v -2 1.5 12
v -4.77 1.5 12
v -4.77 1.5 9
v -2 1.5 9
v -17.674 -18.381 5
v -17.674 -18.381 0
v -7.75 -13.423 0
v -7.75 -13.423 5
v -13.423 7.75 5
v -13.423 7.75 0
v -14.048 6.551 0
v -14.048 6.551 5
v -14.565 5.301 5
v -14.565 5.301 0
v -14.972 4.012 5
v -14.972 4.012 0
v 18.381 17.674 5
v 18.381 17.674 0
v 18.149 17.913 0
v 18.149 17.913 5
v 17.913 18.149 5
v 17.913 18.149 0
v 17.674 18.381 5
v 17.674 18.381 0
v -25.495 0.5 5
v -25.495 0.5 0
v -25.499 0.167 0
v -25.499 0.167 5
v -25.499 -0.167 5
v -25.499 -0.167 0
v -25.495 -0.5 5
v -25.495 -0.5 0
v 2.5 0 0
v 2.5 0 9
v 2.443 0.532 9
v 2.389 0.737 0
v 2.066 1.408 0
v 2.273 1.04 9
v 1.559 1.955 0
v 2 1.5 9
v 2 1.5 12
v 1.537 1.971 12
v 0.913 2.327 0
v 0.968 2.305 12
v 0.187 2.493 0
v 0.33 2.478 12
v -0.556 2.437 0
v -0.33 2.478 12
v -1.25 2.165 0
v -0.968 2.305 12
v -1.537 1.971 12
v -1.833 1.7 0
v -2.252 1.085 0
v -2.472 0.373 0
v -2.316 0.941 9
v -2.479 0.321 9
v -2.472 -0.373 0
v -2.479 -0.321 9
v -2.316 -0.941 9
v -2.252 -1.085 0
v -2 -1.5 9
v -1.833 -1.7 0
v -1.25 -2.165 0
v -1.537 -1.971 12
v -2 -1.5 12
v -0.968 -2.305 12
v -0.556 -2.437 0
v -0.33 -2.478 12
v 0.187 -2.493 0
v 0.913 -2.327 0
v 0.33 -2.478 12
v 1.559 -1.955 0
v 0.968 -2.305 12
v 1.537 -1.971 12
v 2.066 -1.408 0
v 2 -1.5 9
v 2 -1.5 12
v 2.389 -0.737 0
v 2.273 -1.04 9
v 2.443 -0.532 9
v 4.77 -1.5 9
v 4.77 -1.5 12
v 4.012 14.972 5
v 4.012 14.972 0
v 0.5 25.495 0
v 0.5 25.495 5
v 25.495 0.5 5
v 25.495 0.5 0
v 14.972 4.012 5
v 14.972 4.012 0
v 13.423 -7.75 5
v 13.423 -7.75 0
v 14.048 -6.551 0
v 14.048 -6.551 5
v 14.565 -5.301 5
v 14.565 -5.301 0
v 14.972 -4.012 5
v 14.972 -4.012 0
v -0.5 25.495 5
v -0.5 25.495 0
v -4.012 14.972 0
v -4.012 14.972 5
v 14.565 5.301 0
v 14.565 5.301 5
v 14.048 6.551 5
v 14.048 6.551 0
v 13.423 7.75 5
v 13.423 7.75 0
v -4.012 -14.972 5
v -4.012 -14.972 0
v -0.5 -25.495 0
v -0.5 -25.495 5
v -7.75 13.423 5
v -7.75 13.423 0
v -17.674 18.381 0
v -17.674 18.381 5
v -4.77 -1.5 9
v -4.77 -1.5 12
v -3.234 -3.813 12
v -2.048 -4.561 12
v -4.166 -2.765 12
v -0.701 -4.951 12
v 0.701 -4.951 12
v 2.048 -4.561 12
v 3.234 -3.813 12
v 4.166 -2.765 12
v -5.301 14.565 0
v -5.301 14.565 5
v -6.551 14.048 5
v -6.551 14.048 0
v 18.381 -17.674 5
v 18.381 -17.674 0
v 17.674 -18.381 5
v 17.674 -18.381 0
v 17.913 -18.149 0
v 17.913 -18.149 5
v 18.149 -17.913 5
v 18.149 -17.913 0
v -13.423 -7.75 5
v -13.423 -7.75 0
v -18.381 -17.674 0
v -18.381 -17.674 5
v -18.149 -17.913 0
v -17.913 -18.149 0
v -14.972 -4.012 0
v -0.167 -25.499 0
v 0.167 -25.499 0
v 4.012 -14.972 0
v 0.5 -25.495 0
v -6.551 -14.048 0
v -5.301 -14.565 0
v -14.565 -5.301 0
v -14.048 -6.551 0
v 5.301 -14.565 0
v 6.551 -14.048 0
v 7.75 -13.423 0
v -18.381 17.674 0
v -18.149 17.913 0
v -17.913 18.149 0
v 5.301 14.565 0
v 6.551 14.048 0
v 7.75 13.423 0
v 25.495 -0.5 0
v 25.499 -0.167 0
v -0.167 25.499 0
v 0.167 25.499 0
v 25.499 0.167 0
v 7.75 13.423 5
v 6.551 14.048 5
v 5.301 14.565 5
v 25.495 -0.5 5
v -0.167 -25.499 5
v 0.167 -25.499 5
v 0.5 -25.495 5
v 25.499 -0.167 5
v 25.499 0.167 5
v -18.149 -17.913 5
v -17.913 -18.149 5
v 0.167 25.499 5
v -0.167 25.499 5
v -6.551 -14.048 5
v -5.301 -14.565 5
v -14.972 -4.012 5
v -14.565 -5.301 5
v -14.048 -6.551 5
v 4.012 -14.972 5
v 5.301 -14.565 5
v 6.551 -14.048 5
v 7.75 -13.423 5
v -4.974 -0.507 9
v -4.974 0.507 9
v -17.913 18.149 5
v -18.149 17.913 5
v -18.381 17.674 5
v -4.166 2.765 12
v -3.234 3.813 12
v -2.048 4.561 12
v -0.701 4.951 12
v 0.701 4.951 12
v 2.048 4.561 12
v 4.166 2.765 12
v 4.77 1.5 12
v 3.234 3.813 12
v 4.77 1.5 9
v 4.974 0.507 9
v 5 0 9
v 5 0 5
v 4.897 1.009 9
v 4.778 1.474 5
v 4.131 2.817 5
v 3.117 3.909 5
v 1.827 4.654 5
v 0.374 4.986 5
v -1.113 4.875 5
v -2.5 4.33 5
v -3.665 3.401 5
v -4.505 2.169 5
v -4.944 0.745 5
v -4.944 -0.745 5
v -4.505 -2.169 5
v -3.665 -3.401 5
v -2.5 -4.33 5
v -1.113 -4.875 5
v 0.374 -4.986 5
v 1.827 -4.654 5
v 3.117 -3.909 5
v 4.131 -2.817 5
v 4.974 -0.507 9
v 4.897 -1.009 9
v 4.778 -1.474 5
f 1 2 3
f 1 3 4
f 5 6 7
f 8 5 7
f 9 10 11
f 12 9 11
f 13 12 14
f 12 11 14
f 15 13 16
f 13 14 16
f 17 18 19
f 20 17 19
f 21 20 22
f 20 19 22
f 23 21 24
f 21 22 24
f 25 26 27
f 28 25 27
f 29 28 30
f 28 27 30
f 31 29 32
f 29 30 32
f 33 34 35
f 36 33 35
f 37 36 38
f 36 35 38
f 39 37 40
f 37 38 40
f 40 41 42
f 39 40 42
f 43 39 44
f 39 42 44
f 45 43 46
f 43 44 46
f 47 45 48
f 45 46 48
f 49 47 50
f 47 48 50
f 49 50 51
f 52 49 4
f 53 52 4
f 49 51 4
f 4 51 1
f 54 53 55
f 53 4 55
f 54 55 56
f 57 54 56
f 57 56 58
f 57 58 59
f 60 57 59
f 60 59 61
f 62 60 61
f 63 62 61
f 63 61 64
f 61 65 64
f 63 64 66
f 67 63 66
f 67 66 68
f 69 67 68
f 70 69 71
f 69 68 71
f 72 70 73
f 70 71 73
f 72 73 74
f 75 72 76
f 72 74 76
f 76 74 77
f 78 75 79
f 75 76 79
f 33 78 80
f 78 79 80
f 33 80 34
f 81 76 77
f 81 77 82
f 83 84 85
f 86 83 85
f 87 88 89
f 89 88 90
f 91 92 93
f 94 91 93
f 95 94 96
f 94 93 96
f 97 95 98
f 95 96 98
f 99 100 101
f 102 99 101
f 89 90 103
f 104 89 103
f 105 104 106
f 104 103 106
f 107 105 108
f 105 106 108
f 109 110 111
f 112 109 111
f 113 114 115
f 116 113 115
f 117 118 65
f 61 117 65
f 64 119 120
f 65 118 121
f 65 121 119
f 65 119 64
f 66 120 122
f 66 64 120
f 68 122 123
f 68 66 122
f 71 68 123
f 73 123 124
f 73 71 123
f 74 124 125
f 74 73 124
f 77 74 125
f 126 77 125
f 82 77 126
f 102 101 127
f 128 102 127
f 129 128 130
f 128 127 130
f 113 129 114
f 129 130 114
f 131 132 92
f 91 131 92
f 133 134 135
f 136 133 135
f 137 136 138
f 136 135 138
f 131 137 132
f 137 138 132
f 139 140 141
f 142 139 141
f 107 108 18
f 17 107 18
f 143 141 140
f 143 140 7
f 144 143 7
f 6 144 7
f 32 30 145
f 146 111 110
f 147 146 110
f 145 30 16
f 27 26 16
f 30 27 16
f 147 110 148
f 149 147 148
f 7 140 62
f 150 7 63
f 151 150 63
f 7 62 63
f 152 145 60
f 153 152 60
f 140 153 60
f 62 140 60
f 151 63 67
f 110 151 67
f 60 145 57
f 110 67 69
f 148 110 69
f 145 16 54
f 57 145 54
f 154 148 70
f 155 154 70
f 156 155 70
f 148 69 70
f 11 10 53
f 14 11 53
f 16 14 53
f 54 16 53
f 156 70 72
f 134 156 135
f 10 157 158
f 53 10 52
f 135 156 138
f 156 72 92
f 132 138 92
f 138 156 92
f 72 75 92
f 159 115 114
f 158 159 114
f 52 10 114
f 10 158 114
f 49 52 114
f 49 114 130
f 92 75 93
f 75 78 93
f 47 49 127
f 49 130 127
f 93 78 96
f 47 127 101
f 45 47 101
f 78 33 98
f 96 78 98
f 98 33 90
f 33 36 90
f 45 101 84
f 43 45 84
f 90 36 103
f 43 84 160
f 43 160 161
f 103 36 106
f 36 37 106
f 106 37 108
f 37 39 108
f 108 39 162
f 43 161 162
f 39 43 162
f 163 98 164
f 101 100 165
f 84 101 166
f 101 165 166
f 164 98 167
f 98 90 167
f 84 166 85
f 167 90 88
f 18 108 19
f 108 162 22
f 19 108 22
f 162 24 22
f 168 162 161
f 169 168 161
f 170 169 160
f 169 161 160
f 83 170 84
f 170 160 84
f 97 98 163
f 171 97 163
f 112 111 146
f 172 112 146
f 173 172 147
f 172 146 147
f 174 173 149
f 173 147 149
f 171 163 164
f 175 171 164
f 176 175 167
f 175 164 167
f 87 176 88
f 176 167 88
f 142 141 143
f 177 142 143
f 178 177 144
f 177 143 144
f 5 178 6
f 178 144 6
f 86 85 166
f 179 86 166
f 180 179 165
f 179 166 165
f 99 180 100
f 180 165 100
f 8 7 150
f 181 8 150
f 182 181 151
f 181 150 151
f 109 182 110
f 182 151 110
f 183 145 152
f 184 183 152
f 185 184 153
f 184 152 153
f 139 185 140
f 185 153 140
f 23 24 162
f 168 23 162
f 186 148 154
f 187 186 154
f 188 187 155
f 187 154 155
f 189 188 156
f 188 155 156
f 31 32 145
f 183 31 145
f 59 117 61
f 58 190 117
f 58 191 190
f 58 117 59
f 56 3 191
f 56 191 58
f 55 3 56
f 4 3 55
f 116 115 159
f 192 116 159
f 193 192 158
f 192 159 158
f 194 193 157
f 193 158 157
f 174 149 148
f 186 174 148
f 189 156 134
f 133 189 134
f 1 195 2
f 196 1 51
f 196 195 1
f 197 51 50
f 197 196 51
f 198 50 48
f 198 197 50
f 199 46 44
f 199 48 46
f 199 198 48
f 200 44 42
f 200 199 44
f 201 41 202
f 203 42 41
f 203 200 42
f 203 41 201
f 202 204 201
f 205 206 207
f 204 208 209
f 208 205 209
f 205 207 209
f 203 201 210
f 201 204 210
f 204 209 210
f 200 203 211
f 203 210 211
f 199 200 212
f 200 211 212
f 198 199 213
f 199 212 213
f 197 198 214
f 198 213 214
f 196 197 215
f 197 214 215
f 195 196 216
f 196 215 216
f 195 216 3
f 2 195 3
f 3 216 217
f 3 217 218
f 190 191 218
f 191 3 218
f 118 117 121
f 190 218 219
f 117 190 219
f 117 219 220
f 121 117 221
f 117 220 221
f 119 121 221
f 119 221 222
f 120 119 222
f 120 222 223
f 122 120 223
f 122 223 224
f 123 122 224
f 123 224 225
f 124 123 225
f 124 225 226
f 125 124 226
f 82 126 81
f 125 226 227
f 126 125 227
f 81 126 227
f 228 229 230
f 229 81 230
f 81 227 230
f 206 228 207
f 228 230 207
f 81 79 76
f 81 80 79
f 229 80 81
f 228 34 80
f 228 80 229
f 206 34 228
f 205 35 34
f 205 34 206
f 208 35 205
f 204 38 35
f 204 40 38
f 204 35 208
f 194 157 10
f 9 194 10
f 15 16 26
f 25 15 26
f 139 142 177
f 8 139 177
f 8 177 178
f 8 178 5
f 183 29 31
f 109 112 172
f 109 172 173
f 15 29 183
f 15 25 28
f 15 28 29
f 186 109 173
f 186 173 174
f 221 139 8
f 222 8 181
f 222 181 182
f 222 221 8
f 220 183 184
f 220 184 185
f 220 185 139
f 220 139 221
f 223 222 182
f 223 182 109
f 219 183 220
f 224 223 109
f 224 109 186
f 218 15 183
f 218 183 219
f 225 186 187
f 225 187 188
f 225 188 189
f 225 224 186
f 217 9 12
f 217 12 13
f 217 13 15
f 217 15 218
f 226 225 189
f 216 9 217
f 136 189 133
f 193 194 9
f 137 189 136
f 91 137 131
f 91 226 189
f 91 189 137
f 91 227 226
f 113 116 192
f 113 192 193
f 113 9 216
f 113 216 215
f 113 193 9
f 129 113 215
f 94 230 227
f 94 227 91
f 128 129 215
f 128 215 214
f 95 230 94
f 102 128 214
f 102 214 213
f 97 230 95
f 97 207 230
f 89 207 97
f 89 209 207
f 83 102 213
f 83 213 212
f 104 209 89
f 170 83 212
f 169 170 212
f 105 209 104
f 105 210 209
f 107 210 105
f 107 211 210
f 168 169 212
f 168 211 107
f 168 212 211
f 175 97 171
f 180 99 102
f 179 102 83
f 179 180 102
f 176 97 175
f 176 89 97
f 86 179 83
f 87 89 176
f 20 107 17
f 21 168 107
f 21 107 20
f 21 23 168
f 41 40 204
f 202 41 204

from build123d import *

# Parameters (mm, degrees)
F1_DEPTH = 5
F2_R     = 5
F3_DEPTH = 7
F5_R     = 2.5
F6_DEPTH = 12.001
F7_W     = 15.130732
F7_H     = 3
F8_DEPTH = 3


with BuildPart() as f1:
    # F0 (on Top) → F1 (new body)
    with BuildSketch(Plane.XY):
        with BuildLine():
            ThreePointArc((7.75, 13.423394), (5.931593, 14.320133), (4.011695, 14.97185))
            ThreePointArc((4.011695, 14.97185), (0, 15.5), (-4.011695, 14.97185))
            ThreePointArc((-4.011695, 14.97185), (-5.931593, 14.320133), (-7.75, 13.423394))
            ThreePointArc((-7.75, 13.423394), (-10.960155, 10.960155), (-13.423394, 7.75))
            ThreePointArc((-13.423394, 7.75), (-14.320133, 5.931593), (-14.97185, 4.011695))
            ThreePointArc((-14.97185, 4.011695), (-15.5, 0), (-14.97185, -4.011695))
            ThreePointArc((-14.97185, -4.011695), (-14.320133, -5.931593), (-13.423394, -7.75))
            ThreePointArc((-13.423394, -7.75), (-10.960155, -10.960155), (-7.75, -13.423394))
            ThreePointArc((-7.75, -13.423394), (-5.931593, -14.320133), (-4.011695, -14.97185))
            ThreePointArc((-4.011695, -14.97185), (0, -15.5), (4.011695, -14.97185))
            ThreePointArc((4.011695, -14.97185), (5.931593, -14.320133), (7.75, -13.423394))
            ThreePointArc((7.75, -13.423394), (10.960155, -10.960155), (13.423394, -7.75))
            ThreePointArc((13.423394, -7.75), (14.320133, -5.931593), (14.97185, -4.011695))
            ThreePointArc((14.97185, -4.011695), (15.367395, -2.023156), (15.5, 0))
            ThreePointArc((15.5, 0), (15.367395, 2.023156), (14.97185, 4.011695))
            ThreePointArc((14.97185, 4.011695), (14.320133, 5.931593), (13.423394, 7.75))
            ThreePointArc((13.423394, 7.75), (10.960155, 10.960155), (7.75, 13.423394))
        make_face()
        with BuildLine():
            ThreePointArc((-4.011695, 14.97185), (0, 15.5), (4.011695, 14.97185))
            Line((4.011695, 14.97185), (0.499976, 25.495098))
            ThreePointArc((0.499976, 25.495098), (0, 25.5), (-0.499976, 25.495098))
            Line((-0.499976, 25.495098), (-4.011695, 14.97185))
        make_face()
        with BuildLine():
            Line((17.67422, 18.381293), (7.75, 13.423394))
            ThreePointArc((7.75, 13.423394), (10.960155, 10.960155), (13.423394, 7.75))
            Line((13.423394, 7.75), (18.381293, 17.67422))
            ThreePointArc((18.381293, 17.67422), (18.031223, 18.031223), (17.67422, 18.381293))
        make_face()
        with BuildLine():
            ThreePointArc((-13.423394, 7.75), (-10.960155, 10.960155), (-7.75, 13.423394))
            Line((-7.75, 13.423394), (-17.67422, 18.381293))
            ThreePointArc((-17.67422, 18.381293), (-18.031223, 18.031223), (-18.381293, 17.67422))
            Line((-18.381293, 17.67422), (-13.423394, 7.75))
        make_face()
        with BuildLine():
            Line((25.495098, 0.499976), (14.97185, 4.011695))
            ThreePointArc((14.97185, 4.011695), (15.367395, 2.023156), (15.5, 0))
            ThreePointArc((15.5, 0), (15.367395, -2.023156), (14.97185, -4.011695))
            Line((14.97185, -4.011695), (25.495098, -0.499976))
            ThreePointArc((25.495098, -0.499976), (25.5, 0), (25.495098, 0.499976))
        make_face()
        with BuildLine():
            ThreePointArc((-14.97185, -4.011695), (-15.5, 0), (-14.97185, 4.011695))
            Line((-14.97185, 4.011695), (-25.495098, 0.499976))
            ThreePointArc((-25.495098, 0.499976), (-25.5, 0), (-25.495098, -0.499976))
            Line((-25.495098, -0.499976), (-14.97185, -4.011695))
        make_face()
        with BuildLine():
            ThreePointArc((-7.75, -13.423394), (-10.960155, -10.960155), (-13.423394, -7.75))
            Line((-13.423394, -7.75), (-18.381293, -17.67422))
            ThreePointArc((-18.381293, -17.67422), (-18.031223, -18.031223), (-17.67422, -18.381293))
            Line((-17.67422, -18.381293), (-7.75, -13.423394))
        make_face()
        with BuildLine():
            Line((18.381293, -17.67422), (13.423394, -7.75))
            ThreePointArc((13.423394, -7.75), (10.960155, -10.960155), (7.75, -13.423394))
            Line((7.75, -13.423394), (17.67422, -18.381293))
            ThreePointArc((17.67422, -18.381293), (18.031223, -18.031223), (18.381293, -17.67422))
        make_face()
        with BuildLine():
            ThreePointArc((4.011695, -14.97185), (0, -15.5), (-4.011695, -14.97185))
            Line((-4.011695, -14.97185), (-0.499976, -25.495098))
            ThreePointArc((-0.499976, -25.495098), (0, -25.5), (0.499976, -25.495098))
            Line((0.499976, -25.495098), (4.011695, -14.97185))
        make_face()
    extrude(amount=F1_DEPTH)

    # F2 (on face) → F3 (join)
    with BuildSketch(Plane.XY.offset(5)):
        Circle(F2_R)
    extrude(amount=F3_DEPTH)

    # F5 (on face) → F6 (cut, through all)
    with BuildSketch(Plane.XY.offset(12)):
        Circle(F5_R)
    extrude(amount=-F6_DEPTH, mode=Mode.SUBTRACT)

    # F7 (on face) → F8 (cut)
    with BuildSketch(Plane.XY.offset(12)):
        with Locations((0.217972, 0)):
            Rectangle(F7_W, F7_H)
    extrude(amount=-F8_DEPTH, mode=Mode.SUBTRACT)


solid = f1.part
